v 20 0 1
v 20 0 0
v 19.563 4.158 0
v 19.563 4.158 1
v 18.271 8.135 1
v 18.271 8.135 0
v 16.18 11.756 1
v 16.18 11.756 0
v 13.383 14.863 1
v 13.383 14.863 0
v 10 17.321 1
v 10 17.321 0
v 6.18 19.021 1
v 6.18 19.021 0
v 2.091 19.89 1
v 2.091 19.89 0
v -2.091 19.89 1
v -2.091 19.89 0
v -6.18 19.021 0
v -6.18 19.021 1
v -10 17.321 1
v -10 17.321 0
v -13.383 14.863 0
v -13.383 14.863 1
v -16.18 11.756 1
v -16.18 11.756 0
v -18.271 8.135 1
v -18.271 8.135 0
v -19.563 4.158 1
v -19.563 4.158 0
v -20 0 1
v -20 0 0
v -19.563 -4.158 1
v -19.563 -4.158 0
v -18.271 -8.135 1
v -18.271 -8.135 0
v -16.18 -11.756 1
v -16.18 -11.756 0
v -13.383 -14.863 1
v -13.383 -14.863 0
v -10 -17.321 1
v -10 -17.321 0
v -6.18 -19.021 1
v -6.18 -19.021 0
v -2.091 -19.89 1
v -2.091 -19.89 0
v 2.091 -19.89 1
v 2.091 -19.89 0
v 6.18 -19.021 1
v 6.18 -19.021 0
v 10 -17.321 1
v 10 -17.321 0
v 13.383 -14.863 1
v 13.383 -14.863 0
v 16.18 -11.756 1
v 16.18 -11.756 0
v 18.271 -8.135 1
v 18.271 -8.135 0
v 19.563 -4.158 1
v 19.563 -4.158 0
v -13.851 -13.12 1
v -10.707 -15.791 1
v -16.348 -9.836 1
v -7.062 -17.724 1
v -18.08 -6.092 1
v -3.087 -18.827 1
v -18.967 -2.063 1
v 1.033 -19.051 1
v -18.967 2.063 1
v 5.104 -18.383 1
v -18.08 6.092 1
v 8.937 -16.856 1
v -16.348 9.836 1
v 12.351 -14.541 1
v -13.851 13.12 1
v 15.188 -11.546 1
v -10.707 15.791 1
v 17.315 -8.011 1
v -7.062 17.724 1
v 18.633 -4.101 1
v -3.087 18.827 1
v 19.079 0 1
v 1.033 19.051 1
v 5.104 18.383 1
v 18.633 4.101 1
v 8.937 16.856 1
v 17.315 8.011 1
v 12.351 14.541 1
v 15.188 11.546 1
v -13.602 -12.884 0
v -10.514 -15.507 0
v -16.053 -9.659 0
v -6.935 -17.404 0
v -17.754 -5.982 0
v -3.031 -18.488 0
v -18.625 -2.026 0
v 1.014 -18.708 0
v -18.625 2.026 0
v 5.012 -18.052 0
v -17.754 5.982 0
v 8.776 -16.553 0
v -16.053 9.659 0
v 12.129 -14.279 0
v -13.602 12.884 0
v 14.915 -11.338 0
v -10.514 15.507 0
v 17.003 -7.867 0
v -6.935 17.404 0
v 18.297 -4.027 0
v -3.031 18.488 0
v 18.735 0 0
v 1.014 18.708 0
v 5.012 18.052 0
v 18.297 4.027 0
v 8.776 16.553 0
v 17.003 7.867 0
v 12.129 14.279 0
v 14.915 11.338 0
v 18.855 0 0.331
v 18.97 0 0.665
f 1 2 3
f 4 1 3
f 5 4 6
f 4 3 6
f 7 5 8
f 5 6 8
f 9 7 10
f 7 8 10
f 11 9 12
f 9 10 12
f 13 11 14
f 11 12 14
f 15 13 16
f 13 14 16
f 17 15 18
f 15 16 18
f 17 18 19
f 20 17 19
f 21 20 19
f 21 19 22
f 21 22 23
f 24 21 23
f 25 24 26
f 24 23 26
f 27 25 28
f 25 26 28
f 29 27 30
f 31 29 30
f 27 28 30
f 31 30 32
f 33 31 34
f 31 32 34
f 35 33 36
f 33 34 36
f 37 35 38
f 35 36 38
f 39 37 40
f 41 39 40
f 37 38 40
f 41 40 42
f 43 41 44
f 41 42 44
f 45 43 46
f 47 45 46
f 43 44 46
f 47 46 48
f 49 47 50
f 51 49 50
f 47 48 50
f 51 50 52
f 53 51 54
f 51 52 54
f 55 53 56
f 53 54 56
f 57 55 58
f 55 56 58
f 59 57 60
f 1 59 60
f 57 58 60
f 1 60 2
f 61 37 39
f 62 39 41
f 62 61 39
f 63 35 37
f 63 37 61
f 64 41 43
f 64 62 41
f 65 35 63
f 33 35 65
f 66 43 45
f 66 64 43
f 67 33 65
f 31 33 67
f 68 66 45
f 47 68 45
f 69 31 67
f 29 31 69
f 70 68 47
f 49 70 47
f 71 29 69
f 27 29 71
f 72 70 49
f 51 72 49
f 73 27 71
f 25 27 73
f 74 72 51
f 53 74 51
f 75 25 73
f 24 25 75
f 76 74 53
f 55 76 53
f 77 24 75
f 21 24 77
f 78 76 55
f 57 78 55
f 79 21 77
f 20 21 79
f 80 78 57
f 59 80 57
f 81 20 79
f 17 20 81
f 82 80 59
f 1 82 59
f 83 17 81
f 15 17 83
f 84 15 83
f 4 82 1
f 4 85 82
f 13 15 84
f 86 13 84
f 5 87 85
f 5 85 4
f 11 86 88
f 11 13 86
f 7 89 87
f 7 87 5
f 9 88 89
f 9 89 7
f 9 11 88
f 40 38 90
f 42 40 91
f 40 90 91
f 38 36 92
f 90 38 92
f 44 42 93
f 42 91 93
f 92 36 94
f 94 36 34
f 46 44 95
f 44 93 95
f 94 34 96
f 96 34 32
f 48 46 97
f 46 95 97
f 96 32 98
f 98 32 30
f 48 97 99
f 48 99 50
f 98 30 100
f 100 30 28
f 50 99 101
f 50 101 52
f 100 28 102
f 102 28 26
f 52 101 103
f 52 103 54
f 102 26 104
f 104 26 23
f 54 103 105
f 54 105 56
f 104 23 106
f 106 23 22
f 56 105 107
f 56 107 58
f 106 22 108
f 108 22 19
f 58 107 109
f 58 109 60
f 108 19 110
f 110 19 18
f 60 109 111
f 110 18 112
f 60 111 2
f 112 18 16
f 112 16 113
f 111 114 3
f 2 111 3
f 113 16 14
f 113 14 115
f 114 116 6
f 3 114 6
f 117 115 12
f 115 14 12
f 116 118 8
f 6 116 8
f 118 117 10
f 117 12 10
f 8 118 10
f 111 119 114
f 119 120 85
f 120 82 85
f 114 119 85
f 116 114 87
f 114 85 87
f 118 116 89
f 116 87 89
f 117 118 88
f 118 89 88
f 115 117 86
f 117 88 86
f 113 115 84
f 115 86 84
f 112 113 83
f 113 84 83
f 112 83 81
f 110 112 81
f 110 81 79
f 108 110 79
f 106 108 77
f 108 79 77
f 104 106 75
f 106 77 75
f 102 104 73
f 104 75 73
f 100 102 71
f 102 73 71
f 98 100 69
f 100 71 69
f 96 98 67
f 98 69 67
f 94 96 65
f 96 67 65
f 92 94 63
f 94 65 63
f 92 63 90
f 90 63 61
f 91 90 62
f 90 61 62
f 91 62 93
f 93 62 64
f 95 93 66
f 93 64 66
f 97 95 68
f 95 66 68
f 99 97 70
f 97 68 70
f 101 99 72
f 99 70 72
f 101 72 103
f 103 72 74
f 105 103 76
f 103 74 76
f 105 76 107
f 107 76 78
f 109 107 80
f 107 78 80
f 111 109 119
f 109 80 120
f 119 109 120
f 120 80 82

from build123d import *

# Parameters (mm, degrees)
SKETCH_R  = 20
PAD_DEPTH = 1


with BuildPart() as sphere:
    # Sphere → Sphere (revolve)
    with BuildSketch(Plane(origin=(0, 0, 7), x_dir=(1, 0, 0), z_dir=(0, -1, 0))):
        with BuildLine():
            ThreePointArc((0, -20), (20, 0), (0, 20))
            Line((0, 20), (0, -20))
        make_face()
    revolve(axis=Axis((0, 0, 7), (0, 0, 1)))


with BuildPart() as cut:
    # Sketch → Pad (new body)
    with BuildSketch(Plane.XY):
        Circle(SKETCH_R)
    extrude(amount=PAD_DEPTH)

    # Cut: cut Sphere
    add(sphere.part, mode=Mode.SUBTRACT)


solid = cut.part
